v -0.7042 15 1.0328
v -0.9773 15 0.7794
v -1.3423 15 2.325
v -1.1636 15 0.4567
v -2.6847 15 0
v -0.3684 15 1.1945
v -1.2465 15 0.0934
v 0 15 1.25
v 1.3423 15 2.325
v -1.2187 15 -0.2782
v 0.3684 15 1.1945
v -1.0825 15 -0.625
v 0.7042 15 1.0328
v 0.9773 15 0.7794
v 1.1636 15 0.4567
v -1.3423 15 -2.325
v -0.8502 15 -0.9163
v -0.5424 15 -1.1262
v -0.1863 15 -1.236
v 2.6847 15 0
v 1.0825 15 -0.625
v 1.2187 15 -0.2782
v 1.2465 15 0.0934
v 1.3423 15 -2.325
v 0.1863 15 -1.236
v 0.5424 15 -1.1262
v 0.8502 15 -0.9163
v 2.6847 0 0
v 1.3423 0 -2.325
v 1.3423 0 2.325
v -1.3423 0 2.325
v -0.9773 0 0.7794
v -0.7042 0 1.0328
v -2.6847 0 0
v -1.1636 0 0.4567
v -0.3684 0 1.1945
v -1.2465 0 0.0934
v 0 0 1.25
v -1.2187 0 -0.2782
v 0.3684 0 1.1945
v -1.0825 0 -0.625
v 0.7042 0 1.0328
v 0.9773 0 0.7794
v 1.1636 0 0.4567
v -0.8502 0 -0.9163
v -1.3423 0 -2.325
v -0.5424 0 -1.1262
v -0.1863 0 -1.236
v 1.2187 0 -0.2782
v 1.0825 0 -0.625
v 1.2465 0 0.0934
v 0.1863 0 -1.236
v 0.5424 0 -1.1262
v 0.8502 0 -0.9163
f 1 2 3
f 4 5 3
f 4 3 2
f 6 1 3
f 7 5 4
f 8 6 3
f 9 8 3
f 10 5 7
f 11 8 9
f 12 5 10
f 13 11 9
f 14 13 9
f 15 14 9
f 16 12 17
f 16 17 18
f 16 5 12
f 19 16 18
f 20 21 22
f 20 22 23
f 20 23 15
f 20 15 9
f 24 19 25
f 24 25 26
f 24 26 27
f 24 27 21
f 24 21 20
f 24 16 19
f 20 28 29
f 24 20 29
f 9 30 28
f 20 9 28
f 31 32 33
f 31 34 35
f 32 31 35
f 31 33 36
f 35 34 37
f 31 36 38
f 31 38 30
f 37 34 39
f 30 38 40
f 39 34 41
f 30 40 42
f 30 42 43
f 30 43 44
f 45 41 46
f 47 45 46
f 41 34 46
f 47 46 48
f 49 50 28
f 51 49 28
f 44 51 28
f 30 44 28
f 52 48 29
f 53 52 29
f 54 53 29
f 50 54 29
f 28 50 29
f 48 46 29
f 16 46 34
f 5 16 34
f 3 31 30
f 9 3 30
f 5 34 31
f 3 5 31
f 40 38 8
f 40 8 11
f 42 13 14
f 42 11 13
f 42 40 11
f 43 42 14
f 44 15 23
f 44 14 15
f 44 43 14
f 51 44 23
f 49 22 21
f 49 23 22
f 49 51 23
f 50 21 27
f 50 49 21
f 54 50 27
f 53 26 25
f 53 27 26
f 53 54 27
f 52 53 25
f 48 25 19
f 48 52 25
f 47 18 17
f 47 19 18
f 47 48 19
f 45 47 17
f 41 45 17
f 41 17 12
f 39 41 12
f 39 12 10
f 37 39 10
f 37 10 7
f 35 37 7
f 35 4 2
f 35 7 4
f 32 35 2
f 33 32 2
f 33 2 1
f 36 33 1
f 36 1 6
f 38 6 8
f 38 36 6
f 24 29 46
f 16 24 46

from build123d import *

# Parameters (mm, degrees)
BASE_DEPTH      = 15
HOLE_DEPTH      = 16.41470483
HOLE_DEPTH_BACK = 16.41470483
SKETCH2_R       = 1.25


with BuildPart() as part:
    # Sketch1 → base (new body)
    with BuildSketch(Plane(origin=(0, 0, 0), x_dir=(1, 0, 0), z_dir=(0, 1, 0))):
        Polygon((2.684678752, 0), (1.342339376, 2.325), (-1.342339376, 2.325), (-2.684678752, 0), (-1.342339376, -2.325), (1.342339376, -2.325), align=None)
    extrude(amount=BASE_DEPTH)

    # Sketch2 → hole (cut, two sides: drawn at the far end of the back side and taken through both)
    with BuildSketch(Plane(origin=(0, 15, 0), x_dir=(1, 0, 0), z_dir=(0, 1, 0)).offset(-HOLE_DEPTH_BACK)):
        with Locations(Location((0, 0, 0), (0, 0, 270))):
            Circle(SKETCH2_R)
    extrude(amount=HOLE_DEPTH + HOLE_DEPTH_BACK, mode=Mode.SUBTRACT)


solid = part.part
